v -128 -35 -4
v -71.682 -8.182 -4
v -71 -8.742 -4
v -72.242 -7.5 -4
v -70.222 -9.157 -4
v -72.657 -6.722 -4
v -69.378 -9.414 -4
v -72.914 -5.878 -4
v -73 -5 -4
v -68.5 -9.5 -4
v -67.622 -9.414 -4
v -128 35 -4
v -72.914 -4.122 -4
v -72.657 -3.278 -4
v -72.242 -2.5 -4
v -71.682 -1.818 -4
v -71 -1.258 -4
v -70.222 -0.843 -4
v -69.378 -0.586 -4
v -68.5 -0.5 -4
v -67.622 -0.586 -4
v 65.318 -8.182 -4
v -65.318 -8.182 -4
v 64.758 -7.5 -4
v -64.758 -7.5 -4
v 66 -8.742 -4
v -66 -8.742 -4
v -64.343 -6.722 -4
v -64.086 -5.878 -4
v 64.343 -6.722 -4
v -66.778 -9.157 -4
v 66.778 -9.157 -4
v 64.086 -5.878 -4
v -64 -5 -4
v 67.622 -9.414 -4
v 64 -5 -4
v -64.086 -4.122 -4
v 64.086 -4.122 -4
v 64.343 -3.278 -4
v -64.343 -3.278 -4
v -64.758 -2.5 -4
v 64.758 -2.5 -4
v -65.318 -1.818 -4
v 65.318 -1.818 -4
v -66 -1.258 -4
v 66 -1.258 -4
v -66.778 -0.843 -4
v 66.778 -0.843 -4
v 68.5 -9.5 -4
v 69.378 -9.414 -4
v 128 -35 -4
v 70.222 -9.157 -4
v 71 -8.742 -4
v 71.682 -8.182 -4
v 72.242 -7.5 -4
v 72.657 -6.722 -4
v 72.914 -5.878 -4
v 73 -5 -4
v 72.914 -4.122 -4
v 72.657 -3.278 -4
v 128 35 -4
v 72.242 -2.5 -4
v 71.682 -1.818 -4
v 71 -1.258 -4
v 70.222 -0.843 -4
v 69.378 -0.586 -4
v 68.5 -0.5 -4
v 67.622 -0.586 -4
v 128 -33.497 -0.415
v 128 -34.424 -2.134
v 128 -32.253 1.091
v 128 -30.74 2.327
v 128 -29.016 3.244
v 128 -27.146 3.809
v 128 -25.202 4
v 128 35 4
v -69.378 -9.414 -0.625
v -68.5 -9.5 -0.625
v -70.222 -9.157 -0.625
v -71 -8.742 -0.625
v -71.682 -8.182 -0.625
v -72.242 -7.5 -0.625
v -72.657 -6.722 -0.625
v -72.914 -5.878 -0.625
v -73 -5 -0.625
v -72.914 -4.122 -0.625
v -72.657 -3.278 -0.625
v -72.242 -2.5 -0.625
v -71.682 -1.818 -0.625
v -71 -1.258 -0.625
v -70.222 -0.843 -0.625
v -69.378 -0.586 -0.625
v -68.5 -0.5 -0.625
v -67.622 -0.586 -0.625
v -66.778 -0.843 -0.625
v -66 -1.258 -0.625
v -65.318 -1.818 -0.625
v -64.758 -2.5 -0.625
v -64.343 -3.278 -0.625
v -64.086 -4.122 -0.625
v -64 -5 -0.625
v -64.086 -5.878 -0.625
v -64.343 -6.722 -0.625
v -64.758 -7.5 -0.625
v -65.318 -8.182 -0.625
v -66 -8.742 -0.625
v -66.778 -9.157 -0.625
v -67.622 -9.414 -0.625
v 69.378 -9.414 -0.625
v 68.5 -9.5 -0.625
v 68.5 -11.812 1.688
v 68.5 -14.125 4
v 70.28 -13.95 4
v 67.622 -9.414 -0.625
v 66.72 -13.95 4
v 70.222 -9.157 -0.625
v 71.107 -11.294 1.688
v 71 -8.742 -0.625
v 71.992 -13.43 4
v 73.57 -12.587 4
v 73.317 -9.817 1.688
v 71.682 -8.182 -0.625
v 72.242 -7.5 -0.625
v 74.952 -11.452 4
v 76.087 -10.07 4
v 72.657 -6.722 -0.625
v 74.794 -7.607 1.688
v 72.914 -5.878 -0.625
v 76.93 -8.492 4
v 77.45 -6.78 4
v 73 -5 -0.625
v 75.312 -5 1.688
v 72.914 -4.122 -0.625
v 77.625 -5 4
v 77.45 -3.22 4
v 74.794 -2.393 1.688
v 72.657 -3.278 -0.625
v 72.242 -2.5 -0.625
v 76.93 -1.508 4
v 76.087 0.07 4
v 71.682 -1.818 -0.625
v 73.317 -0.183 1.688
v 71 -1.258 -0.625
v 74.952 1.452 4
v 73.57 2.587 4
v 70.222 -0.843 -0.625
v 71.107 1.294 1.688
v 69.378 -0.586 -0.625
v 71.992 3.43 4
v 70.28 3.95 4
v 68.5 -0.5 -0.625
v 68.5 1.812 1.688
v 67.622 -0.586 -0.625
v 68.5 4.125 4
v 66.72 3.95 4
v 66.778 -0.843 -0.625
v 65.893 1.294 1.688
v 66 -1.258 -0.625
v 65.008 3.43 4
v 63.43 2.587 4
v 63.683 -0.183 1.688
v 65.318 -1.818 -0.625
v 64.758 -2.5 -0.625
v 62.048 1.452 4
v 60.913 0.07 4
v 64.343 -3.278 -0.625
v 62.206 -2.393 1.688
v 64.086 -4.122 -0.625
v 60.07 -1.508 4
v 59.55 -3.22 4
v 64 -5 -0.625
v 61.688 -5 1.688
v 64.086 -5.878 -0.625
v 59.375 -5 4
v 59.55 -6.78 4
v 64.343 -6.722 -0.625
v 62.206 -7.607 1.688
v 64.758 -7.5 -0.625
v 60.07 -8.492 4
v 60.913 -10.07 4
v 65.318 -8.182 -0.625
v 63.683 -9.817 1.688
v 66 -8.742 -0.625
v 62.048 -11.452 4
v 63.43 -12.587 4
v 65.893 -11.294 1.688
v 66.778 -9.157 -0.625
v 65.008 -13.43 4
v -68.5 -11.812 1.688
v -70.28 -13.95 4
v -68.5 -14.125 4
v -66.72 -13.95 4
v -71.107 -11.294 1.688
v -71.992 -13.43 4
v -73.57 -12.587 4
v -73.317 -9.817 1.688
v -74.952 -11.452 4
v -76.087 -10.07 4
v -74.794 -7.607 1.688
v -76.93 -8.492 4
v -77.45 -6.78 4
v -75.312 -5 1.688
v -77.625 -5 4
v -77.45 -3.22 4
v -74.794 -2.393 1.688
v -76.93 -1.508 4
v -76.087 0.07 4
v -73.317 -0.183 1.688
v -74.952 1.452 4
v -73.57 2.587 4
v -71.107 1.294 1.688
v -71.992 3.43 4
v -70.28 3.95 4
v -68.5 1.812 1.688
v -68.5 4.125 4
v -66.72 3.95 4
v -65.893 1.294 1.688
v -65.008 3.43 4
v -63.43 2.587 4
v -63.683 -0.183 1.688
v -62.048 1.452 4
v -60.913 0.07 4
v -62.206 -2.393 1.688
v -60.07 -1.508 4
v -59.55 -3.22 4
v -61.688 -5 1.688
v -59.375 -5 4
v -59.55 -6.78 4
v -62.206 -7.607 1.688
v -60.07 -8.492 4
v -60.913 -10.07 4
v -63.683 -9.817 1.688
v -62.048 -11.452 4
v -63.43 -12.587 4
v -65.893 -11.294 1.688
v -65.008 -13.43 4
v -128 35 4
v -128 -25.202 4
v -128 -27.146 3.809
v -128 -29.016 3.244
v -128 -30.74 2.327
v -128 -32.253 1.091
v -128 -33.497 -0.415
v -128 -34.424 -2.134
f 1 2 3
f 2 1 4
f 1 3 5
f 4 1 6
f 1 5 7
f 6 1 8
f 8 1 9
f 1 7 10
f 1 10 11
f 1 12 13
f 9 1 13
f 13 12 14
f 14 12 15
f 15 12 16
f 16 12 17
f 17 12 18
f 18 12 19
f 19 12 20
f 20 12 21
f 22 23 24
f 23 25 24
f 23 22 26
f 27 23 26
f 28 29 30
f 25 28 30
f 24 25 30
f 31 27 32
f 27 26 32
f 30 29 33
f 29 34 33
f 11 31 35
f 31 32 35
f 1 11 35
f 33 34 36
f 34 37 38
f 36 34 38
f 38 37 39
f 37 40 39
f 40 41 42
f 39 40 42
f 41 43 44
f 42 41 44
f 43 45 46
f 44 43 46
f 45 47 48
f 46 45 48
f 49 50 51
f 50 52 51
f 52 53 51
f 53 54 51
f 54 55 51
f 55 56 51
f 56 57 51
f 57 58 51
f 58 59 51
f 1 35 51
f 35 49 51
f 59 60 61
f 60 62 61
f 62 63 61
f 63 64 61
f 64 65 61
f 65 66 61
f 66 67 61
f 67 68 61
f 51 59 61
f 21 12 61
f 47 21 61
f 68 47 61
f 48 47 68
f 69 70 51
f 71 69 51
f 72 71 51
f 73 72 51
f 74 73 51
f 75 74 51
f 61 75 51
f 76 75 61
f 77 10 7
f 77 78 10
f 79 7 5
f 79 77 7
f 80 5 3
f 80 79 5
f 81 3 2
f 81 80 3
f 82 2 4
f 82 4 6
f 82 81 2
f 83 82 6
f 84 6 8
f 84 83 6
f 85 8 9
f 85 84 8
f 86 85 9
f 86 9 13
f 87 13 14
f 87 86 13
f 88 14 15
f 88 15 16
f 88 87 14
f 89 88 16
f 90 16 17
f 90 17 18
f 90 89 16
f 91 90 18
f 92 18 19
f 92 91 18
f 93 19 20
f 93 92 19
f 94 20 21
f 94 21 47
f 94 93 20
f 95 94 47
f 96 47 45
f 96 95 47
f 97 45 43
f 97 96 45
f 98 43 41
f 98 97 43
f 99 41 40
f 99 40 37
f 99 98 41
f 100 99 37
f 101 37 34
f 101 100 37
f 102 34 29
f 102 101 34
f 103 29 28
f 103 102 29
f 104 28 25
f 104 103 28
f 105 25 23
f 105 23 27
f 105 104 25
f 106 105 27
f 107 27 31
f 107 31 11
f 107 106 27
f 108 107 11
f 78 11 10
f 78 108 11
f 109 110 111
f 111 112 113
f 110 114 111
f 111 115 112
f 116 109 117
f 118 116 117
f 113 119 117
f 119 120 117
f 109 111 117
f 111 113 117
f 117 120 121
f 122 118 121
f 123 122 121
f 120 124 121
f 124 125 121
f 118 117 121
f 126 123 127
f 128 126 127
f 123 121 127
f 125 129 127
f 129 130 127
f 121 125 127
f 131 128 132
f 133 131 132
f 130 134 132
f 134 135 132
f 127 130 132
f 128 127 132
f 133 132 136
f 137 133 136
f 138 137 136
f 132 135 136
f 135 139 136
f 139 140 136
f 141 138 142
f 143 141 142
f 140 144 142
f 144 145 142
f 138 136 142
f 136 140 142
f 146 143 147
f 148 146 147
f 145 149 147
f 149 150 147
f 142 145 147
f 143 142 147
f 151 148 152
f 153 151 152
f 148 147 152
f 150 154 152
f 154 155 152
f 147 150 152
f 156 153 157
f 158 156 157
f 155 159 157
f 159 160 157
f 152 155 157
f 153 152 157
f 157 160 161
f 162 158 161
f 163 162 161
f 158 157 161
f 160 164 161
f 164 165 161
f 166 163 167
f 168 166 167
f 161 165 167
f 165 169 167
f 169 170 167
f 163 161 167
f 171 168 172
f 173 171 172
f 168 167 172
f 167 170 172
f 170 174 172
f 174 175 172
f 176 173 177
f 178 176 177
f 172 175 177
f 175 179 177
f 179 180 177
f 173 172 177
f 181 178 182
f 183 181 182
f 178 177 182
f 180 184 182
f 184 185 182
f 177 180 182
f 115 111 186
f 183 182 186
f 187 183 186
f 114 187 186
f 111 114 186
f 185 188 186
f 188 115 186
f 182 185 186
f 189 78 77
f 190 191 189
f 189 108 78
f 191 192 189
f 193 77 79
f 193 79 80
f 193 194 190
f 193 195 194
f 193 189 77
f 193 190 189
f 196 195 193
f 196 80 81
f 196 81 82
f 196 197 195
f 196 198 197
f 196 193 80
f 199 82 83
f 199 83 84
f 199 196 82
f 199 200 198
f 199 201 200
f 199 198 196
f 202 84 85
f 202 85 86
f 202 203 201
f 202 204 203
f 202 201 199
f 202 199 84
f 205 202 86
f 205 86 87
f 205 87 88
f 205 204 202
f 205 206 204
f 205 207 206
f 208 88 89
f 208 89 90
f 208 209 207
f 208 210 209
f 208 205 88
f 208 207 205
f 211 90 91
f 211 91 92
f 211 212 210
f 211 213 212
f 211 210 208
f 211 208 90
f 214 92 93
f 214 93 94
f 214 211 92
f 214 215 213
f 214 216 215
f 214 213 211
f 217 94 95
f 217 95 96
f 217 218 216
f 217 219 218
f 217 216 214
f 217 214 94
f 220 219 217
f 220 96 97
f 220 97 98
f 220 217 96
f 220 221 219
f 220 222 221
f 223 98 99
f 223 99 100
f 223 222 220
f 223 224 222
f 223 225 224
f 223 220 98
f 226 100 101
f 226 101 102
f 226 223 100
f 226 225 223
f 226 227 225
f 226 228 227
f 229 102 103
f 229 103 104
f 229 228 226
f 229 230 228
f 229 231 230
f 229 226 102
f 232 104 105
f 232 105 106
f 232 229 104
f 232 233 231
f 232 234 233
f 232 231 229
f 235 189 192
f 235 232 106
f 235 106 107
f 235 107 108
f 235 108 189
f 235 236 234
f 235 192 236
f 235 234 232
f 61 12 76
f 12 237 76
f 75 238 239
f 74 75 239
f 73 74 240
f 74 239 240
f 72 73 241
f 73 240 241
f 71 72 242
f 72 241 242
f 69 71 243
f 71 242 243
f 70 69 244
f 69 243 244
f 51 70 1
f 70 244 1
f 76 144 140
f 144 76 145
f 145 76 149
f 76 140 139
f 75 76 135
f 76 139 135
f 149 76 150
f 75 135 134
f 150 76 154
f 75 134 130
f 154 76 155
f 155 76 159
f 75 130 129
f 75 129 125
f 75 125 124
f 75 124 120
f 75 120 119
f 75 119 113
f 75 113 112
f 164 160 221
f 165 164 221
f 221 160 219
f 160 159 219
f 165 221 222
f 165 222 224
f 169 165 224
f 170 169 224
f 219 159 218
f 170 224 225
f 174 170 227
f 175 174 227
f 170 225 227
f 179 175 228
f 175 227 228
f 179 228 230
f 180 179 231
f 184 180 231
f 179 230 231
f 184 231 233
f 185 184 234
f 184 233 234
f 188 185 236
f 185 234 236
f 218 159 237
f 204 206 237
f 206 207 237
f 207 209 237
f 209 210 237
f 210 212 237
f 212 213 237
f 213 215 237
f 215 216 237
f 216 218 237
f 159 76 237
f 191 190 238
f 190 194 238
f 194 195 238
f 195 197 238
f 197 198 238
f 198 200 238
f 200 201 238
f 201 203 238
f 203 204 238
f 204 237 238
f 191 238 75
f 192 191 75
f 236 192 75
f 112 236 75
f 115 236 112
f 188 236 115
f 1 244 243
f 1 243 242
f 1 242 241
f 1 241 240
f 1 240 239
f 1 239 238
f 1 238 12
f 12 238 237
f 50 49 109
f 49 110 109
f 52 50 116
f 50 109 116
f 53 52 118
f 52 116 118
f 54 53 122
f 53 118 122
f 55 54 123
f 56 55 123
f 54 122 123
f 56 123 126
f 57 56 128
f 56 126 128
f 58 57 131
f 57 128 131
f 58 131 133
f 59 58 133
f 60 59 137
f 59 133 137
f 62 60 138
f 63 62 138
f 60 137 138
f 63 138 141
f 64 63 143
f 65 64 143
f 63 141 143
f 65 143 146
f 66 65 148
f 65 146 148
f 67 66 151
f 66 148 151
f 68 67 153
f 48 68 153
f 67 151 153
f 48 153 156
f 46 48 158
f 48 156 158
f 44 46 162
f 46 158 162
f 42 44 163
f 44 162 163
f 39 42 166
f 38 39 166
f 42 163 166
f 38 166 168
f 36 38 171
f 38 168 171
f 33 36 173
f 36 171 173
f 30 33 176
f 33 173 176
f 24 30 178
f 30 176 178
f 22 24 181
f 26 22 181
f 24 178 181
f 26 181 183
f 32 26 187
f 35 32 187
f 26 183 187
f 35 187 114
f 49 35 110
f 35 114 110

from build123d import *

# Parameters (mm, degrees)
SKETCH_1_W          = 256
SKETCH_1_H          = 70
EXTRUDE_1_DEPTH     = 4
FILLET_1_R          = 10
SHEET_START         = -128
SHEET_METAL_1_DEPTH = 256
FILLET_2_R          = 10


# Read off the part's stored shape, not the designer's step: Преобразовать-Твердое тело1
with BuildPart() as part:
    # Sketch 1 → Бобышка-Вытянуть1 (new, symmetric)
    with BuildSketch(Plane.XY):
        Rectangle(SKETCH_1_W, SKETCH_1_H)
    extrude(amount=EXTRUDE_1_DEPTH, both=True)

    # Скругление1
    # the kernel refuses this fillet: 10 mm, written as the material it takes off along each edge
    with BuildSketch(Plane(origin=(-152.494897428, -35, 4), x_dir=(0, 0, -1), z_dir=(1, 0, 0))) as fillet_1_piece_1:
        with BuildLine():
            CenterArc((10, 9.797958971), FILLET_1_R, 180, 78.463040967)
            Line((0, 9.797958971), (-0.2, 9.797958971))
            Line((-0.2, 9.797958971), (-0.2, 0))
            Line((-0.2, 0), (0, -0.2))
            ThreePointArc((0, -0.2), (4, -0.2), (7.96, -0.195959179))
            Line((7.96, -0.195959179), (8, 0))
        make_face()
    extrude(amount=304.989794856, mode=Mode.SUBTRACT)

    # Sheet Metal 1 outline → Sheet Metal 1 (add)
    with BuildSketch(Plane.YZ.offset(SHEET_START)):
        with BuildLine():
            Line((-35, 4), (-35, -4))
            ThreePointArc((-35, -4), (-31.526596349, 1.745966692), (-25.202041029, 4))
            Line((-25.202041029, 4), (-35, 4))
        make_face()
    extrude(amount=SHEET_METAL_1_DEPTH)

    # Скругление2
    # the kernel refuses this fillet: 10 mm, written as the material it takes off along each edge
    with BuildSketch(Plane(origin=(-152.494897428, -35, 4), x_dir=(0, 1, 0), z_dir=(1, 0, 0))) as fillet_2_piece_1:
        with BuildLine():
            CenterArc((9.797958971, -10), FILLET_2_R, 90, 78.463040967)
            Line((0, -8), (-0.195959179, -7.96))
            ThreePointArc((-0.195959179, -7.96), (-0.2, -4), (-0.2, 0))
            Line((-0.2, 0), (0, 0.2))
            Line((0, 0.2), (9.797958971, 0.2))
            Line((9.797958971, 0.2), (9.797958971, 0))
        make_face()
    extrude(amount=304.989794856, mode=Mode.SUBTRACT)

    # Эскиз8 → Зенковка для винта с потайной головкой M81 (revolve, cut)
    with BuildSketch(Plane(origin=(-68.5, -5, 4), x_dir=(0, -1, 0), z_dir=(1, 0, 0))):
        Polygon((0, 0), (0, 8), (4.5, 8), (4.5, 4.625), (9.125, 0), align=None)
    hole_wizard_m81 = revolve(axis=Axis((-68.5, -5, 10.35), (0, 0, -1)), mode=Mode.SUBTRACT)

    # Зеркальное отражение1: Зенковка для винта с потайной головкой M81 across plane
    add(hole_wizard_m81.mirror(Plane(origin=(0, 0, 0), x_dir=(0, 0, 1), z_dir=(1, 0, 0))), mode=Mode.SUBTRACT)


solid = part.part
